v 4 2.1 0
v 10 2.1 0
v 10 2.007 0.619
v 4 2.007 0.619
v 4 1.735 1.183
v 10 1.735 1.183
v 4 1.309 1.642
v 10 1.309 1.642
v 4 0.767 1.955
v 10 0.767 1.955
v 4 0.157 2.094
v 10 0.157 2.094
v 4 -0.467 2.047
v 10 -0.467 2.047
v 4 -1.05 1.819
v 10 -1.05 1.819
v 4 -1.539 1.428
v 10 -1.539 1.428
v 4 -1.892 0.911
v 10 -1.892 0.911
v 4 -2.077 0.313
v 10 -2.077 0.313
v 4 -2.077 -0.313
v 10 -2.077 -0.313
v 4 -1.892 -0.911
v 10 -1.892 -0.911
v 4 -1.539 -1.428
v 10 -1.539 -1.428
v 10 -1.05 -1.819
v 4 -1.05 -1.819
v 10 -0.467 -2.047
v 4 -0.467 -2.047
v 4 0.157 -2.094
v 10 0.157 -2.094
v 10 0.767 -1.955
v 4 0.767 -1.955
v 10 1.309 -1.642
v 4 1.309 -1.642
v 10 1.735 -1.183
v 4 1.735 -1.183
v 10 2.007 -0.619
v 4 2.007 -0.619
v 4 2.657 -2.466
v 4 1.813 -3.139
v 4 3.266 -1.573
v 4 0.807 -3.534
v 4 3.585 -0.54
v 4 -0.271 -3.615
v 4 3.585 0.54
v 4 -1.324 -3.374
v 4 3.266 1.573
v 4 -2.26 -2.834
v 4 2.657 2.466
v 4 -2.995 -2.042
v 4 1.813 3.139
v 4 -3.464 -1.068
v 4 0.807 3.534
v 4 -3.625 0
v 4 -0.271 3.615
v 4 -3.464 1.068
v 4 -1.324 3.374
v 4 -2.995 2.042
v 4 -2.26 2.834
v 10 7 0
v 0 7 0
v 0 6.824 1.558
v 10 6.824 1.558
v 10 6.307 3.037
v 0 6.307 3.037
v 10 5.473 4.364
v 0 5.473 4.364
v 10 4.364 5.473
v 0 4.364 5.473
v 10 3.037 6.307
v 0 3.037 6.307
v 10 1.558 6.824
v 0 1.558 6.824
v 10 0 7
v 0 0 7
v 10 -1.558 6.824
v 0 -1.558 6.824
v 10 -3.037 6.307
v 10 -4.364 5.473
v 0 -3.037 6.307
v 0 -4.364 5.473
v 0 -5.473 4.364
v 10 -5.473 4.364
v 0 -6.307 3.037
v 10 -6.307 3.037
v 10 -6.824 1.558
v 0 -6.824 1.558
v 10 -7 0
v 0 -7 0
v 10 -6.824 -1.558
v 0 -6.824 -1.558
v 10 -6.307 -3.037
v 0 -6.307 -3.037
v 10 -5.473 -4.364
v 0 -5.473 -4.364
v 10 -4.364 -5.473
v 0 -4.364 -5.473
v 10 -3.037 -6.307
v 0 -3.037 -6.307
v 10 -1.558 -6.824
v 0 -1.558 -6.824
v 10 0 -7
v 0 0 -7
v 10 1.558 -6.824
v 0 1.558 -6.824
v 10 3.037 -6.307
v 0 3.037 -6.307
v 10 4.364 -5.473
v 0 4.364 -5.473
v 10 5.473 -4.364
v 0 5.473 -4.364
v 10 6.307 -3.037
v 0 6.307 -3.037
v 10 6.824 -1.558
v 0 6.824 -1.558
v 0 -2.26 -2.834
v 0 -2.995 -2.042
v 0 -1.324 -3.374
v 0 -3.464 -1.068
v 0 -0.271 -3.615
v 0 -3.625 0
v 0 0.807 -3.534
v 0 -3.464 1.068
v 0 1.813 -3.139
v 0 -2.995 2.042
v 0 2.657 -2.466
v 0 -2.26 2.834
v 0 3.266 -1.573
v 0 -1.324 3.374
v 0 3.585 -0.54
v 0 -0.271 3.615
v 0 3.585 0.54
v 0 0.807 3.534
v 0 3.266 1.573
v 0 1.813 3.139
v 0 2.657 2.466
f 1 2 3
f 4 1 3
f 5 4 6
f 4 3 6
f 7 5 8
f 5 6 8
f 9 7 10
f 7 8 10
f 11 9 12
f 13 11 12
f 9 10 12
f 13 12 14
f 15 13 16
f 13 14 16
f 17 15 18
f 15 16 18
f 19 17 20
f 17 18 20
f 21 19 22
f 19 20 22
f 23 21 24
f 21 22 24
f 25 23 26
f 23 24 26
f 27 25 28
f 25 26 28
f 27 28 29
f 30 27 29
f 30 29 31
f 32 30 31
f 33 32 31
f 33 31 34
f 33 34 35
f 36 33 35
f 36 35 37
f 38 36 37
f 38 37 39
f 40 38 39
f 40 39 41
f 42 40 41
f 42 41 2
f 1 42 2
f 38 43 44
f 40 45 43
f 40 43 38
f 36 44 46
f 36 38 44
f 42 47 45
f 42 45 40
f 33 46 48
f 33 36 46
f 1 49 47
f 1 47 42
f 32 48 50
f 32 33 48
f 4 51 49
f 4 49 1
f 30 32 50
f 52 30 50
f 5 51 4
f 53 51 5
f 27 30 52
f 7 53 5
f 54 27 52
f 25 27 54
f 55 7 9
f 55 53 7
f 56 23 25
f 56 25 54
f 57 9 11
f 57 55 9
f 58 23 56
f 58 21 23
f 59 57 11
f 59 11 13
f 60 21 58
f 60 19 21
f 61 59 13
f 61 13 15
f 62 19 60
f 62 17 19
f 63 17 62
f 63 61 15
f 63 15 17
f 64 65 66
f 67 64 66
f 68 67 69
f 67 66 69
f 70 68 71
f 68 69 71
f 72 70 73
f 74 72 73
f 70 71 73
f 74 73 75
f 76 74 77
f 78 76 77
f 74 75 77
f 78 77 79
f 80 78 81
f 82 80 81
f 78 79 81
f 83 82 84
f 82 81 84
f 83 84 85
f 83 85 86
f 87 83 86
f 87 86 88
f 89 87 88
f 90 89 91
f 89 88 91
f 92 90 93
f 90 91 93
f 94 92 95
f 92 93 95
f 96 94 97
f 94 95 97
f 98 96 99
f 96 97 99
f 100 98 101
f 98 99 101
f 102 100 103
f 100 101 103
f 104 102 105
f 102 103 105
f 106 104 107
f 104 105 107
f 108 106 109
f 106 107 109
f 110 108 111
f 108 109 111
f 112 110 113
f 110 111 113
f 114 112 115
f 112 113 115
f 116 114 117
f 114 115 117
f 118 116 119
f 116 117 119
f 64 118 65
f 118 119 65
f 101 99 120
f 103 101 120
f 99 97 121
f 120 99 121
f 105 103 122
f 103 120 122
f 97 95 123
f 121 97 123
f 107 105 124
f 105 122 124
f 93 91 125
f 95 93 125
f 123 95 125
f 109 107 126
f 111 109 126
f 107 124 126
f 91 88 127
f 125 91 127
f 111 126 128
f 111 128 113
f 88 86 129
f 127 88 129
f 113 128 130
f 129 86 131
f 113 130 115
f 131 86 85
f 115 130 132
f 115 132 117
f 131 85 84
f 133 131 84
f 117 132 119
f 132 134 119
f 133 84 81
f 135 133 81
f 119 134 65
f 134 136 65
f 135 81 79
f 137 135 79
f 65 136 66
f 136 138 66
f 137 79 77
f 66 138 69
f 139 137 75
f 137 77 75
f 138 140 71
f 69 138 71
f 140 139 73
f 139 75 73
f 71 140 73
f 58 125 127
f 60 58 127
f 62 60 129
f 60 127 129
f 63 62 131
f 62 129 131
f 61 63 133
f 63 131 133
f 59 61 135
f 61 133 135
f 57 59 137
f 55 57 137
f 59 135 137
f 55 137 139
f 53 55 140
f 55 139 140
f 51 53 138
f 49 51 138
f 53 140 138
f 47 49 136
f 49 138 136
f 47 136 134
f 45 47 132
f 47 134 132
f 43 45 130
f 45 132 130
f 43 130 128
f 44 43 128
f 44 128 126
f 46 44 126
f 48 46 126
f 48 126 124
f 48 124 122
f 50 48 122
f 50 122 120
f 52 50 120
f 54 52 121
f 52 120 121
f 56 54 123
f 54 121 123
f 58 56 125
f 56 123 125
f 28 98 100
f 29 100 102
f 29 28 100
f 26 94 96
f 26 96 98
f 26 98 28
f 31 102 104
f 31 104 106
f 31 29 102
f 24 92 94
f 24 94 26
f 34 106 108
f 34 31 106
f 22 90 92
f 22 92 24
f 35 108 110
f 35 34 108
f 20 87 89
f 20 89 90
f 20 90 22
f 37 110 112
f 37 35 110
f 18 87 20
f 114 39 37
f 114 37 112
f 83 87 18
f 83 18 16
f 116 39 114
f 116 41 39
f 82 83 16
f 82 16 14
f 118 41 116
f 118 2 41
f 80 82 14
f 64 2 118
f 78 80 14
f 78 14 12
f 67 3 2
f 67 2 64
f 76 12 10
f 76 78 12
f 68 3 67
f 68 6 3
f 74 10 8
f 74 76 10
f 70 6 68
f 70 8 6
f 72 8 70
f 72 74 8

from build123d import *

# Parameters (mm, degrees)
F0_R     = 7
F1_DEPTH = 10
F2_R     = 3.625
F3_DEPTH = 4
F4_R     = 2.1
F5_DEPTH = 10.001


with BuildPart() as f1:
    # F0 (on Right) → F1 (new body)
    with BuildSketch(Plane.YZ):
        Circle(F0_R)
    extrude(amount=F1_DEPTH)

    # F2 (on face) → F3 (cut)
    with BuildSketch(Plane(origin=(0, 0, 0), x_dir=(0, -1, 0), z_dir=(-1, 0, 0))):
        Circle(F2_R)
    extrude(amount=-F3_DEPTH, mode=Mode.SUBTRACT)

    # F4 (on face) → F5 (cut, through all)
    with BuildSketch(Plane.YZ.offset(10)):
        Circle(F4_R)
    extrude(amount=-F5_DEPTH, mode=Mode.SUBTRACT)


solid = f1.part
